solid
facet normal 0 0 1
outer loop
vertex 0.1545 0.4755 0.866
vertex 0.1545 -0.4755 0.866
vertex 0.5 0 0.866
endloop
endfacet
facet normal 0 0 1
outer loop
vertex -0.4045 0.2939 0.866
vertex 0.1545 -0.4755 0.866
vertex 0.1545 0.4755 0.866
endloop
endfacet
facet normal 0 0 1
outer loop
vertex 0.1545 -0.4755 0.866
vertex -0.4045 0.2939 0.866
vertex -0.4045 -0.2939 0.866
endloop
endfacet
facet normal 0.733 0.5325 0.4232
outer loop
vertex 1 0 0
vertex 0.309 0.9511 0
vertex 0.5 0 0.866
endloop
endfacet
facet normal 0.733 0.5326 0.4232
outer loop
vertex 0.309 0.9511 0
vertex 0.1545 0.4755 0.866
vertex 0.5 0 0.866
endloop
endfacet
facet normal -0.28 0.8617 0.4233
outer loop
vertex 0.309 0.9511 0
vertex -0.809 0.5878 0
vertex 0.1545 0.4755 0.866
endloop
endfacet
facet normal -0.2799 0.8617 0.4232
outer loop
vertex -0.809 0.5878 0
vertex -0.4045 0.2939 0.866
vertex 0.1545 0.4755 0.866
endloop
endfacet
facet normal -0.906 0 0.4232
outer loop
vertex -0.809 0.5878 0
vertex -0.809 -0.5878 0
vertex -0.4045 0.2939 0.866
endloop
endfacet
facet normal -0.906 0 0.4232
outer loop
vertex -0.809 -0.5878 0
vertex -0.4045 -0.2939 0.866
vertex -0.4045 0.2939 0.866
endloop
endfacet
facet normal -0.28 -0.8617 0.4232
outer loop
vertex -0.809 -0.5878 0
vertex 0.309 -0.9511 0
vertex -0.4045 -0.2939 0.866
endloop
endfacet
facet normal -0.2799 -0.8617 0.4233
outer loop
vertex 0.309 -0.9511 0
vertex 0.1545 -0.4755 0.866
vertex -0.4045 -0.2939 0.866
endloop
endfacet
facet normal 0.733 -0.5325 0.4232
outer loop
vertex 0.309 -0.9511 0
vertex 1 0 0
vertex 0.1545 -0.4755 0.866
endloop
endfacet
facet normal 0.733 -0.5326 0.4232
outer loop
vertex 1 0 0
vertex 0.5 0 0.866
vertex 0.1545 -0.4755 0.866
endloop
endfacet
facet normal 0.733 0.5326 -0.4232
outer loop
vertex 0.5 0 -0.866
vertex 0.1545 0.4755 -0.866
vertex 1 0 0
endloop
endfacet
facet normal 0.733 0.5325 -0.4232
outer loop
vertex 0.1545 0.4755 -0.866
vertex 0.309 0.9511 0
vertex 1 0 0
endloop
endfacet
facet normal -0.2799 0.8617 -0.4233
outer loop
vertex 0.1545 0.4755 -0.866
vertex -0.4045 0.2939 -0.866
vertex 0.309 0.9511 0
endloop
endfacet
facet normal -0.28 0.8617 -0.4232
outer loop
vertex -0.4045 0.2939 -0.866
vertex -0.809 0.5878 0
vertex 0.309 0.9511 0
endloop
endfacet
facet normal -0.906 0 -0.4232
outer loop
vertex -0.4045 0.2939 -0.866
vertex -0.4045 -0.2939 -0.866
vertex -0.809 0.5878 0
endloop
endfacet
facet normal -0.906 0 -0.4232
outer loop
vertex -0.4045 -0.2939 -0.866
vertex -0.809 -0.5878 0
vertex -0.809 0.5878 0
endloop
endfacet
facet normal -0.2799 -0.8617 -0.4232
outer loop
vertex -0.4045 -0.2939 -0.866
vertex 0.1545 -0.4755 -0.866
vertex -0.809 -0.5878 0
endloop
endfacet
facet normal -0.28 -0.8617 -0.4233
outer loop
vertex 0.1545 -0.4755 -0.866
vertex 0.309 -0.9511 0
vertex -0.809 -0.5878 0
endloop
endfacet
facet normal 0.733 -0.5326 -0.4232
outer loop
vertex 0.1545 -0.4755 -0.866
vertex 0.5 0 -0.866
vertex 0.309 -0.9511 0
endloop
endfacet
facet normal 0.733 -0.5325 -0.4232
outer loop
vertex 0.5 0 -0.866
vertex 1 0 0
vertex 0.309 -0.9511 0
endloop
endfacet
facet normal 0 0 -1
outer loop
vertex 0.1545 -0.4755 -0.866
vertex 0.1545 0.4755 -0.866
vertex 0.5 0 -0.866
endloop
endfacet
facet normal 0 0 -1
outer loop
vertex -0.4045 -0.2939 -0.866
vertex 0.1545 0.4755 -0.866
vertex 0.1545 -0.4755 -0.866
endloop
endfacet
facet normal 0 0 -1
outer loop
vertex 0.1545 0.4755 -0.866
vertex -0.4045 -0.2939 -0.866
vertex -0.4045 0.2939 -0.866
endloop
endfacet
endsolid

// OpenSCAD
echo( "Random Vector: ",rands(5,15,4,42));
echo( "abs: ",abs(-9));
echo( "sign: ",sign(9));
echo( "sign: ",sign(-9));
echo( "cos: ",cos(9));
echo( "sin: ",sin(9));
echo( "tan: ",tan(9));
echo( "acos: ",acos(0.1));
echo( "asin: ",asin(0.1));
echo( "atan: ",atan(9));
echo( "atan2: ",atan2(1,2));

echo( "min: ",min(1,2));
echo( "max: ",max(1,2));
echo( "pow: ",pow(1,2));
echo( "sqrt: ",sqrt(2));
echo( "ln: ",ln(1));

echo( "ceil: ",ceil(2.5));
echo( "ceil: ",ceil(-2.5));
echo( "floor: ",floor(2.5));
echo( "floor: ",floor(-2.5));
echo( "log: ",log(10));
echo( "log: ",log(10,2));
echo( "exp: ",exp(2));

echo("sign");
echo(sign(-5.0));
echo(sign(0));
echo(sign(8.0));

echo("round");
echo(round(2.5));// = x+1.
echo(round(2.49));// = x.
echo(round(-(2.5)));// = -(x+1).
echo(round(-(2.49)));// = -x.

echo(round(5.4));// //-> 5
echo(round(5.5));// //-> 6
echo(round(5.6));// //-> 6

sphere();
